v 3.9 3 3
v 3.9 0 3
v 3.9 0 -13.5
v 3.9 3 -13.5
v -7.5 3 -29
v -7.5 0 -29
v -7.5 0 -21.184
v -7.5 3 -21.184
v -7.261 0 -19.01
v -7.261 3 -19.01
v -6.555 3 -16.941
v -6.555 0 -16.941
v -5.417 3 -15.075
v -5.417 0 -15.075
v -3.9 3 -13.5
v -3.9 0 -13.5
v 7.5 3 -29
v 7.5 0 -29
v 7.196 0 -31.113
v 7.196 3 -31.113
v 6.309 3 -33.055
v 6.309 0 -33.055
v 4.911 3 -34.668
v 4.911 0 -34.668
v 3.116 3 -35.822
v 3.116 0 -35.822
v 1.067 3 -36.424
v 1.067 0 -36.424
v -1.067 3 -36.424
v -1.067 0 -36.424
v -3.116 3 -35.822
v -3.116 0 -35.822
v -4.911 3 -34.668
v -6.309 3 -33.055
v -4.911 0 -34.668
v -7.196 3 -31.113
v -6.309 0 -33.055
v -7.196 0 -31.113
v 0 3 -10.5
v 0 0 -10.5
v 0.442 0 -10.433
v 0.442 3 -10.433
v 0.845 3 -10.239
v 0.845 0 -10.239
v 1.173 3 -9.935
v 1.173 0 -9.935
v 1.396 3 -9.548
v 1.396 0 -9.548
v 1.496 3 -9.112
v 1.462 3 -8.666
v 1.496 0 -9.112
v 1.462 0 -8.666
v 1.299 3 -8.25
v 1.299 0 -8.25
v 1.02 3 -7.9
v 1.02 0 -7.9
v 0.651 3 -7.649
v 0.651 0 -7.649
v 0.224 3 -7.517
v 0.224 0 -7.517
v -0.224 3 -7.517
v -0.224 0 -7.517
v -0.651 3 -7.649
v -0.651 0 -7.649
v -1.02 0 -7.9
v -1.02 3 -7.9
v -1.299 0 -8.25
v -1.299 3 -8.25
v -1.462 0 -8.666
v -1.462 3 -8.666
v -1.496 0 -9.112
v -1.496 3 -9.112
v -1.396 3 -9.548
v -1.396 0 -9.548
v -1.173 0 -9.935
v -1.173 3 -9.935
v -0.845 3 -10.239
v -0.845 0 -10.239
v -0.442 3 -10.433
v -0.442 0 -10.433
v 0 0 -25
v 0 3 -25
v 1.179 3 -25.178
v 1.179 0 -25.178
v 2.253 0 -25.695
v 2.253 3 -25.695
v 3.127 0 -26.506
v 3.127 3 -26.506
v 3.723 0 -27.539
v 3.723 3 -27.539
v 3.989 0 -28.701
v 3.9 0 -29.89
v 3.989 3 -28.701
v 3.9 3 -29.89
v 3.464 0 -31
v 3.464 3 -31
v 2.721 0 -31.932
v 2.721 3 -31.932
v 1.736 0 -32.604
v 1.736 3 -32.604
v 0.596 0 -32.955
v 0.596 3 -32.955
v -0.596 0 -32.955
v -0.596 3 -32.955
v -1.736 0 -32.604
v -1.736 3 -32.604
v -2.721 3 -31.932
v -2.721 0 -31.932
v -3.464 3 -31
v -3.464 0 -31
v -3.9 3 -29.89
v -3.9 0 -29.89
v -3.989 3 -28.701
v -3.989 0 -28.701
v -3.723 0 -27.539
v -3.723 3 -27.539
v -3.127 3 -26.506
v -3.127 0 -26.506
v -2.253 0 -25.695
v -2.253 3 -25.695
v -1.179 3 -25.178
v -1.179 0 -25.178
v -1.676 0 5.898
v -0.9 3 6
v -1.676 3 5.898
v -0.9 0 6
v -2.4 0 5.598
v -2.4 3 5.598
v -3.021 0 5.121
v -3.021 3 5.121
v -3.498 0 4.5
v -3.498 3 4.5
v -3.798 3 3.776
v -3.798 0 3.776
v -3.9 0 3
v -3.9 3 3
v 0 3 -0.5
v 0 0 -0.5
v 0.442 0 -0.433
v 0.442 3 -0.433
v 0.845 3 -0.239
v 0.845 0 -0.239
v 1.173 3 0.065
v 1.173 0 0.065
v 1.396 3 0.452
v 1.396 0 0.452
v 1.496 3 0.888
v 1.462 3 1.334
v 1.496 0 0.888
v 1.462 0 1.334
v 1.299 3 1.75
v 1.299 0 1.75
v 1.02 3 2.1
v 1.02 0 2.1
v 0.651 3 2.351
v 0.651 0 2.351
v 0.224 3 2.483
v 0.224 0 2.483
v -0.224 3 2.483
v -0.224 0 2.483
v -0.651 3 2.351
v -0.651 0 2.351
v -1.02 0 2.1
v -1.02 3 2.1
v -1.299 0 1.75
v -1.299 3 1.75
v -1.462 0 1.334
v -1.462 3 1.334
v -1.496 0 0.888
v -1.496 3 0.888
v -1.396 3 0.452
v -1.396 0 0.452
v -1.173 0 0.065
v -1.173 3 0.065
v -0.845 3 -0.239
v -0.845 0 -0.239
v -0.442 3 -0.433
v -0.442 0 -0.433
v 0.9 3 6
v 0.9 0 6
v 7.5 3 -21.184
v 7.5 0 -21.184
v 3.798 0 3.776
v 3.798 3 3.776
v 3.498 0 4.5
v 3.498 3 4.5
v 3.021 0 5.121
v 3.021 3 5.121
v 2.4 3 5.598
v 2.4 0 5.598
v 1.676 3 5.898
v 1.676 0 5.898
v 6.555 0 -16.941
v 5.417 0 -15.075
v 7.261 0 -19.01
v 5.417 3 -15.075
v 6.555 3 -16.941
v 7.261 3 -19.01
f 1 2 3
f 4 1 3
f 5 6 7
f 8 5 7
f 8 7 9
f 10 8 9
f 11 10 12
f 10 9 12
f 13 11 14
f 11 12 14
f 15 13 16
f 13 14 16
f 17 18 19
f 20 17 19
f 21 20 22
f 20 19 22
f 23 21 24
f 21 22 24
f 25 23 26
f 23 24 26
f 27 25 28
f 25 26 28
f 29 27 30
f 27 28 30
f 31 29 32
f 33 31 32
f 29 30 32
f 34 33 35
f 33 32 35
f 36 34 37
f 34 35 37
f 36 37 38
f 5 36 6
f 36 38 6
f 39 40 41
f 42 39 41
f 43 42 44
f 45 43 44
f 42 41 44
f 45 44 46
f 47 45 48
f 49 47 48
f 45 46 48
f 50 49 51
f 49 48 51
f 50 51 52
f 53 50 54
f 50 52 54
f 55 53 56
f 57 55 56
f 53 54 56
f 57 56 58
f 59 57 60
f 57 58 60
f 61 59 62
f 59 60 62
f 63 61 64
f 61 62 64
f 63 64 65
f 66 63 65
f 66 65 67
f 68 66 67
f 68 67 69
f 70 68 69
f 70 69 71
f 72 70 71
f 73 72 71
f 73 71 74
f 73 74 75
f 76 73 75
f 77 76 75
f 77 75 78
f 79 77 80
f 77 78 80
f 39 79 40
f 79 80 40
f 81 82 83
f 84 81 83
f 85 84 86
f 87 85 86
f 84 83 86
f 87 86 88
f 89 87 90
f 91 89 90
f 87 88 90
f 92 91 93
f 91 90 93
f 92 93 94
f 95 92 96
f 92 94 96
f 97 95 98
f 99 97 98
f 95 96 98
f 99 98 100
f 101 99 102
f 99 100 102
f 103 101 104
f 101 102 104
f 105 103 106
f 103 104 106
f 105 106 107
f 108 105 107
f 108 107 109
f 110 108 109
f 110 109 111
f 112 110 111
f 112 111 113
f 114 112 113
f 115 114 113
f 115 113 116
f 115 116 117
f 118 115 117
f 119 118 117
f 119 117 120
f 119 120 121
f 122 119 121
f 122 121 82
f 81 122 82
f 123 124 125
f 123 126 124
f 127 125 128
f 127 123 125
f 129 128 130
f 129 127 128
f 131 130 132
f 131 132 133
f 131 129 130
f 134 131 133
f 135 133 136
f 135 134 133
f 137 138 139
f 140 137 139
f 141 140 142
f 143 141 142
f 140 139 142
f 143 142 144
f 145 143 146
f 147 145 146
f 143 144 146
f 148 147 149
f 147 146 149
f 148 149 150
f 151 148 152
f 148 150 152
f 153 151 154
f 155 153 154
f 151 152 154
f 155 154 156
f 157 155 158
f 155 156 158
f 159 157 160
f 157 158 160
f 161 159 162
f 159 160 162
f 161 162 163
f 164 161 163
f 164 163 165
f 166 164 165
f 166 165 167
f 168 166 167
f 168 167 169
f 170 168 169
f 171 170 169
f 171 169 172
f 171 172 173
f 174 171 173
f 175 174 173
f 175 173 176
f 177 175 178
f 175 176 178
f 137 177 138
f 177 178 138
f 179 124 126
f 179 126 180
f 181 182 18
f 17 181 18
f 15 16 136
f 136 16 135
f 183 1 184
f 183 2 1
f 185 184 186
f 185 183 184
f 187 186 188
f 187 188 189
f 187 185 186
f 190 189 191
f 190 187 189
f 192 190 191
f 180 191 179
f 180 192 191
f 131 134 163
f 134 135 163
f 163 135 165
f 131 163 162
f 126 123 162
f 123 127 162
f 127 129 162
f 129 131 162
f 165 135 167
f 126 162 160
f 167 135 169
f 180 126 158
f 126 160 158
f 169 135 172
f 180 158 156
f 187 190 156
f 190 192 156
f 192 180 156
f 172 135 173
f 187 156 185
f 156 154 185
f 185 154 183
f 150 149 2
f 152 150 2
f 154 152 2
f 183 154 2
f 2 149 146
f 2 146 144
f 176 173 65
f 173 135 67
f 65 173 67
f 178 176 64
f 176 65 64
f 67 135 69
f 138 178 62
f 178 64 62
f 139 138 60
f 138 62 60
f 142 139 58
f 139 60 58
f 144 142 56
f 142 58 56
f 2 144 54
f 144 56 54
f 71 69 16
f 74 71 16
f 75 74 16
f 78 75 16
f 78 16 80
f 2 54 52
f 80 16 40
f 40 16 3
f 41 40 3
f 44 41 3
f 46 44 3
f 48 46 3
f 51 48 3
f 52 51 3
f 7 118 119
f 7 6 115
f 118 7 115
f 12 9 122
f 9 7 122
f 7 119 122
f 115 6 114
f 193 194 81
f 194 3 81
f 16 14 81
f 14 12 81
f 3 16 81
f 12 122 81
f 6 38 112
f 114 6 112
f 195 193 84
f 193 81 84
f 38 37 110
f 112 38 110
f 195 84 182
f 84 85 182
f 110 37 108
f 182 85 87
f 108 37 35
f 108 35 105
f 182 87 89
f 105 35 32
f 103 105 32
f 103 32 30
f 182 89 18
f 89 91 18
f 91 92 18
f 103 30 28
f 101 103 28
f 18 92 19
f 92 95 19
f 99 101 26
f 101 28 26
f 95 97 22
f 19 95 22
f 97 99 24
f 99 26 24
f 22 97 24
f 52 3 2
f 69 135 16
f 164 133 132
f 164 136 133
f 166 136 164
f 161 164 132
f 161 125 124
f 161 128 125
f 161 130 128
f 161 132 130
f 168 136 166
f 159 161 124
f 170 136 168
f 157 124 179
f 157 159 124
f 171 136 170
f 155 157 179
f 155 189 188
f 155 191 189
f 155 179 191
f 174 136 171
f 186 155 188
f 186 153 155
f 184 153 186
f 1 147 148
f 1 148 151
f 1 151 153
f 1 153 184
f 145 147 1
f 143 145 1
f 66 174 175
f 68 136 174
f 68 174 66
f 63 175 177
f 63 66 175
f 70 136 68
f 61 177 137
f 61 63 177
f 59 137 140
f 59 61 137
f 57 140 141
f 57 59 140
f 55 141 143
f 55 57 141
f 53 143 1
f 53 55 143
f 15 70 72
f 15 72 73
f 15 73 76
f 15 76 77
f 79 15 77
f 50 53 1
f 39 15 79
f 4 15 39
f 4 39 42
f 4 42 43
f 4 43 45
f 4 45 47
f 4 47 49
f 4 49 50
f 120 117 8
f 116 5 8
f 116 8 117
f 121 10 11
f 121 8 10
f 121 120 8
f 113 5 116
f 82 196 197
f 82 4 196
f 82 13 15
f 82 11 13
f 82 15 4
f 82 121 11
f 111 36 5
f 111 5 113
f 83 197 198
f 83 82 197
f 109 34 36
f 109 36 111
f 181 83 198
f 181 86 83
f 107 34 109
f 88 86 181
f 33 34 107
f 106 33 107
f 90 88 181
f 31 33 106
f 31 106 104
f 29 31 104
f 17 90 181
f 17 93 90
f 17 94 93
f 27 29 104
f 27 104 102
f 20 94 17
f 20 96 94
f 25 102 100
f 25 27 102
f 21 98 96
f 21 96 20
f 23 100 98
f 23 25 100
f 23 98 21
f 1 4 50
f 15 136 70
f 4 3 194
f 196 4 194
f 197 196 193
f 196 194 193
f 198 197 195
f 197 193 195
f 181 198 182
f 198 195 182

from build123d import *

# Parameters (mm, degrees)
EXTRUDE_1_DEPTH     = 3
SKETCH_2_R          = 4
CUT_EXTRUDE_1_DEPTH = 8
SKETCH_3_R          = 1.5
CUT_EXTRUDE_2_DEPTH = 3
CUT_EXTRUDE_3_DEPTH = 10
FILLET_1_R          = 10
SKETCH_5_W          = 7.8
SKETCH_5_H          = 20.5
CUT_EXTRUDE_4_DEPTH = 10
FILLET_3_R          = 3


with BuildPart() as part:
    # 草图1 → 凸台-拉伸1 (new body)
    with BuildSketch(Plane(origin=(0, 0, 0), x_dir=(1, 0, 0), z_dir=(0, 1, 0))):
        with BuildLine():
            Line((-7.5, -29), (7.5, -29))
            Line((7.5, -29), (7.5, 29))
            ThreePointArc((7.5, 29), (0, 36.5), (-7.5, 29))
            Line((-7.5, 29), (-7.5, -29))
        make_face()
    extrude(amount=EXTRUDE_1_DEPTH)

    # 草图2 → 切除-拉伸1 (cut)
    with BuildSketch(Plane(origin=(0, 3, 0), x_dir=(1, 0, 0), z_dir=(0, 1, 0))):
        with Locations(Location((0, 29, 0), (0, 0, 270))):
            Circle(SKETCH_2_R)
    extrude(amount=-CUT_EXTRUDE_1_DEPTH, mode=Mode.SUBTRACT)

    # 草图3 → 切除-拉伸2 (cut)
    with BuildSketch(Plane.XZ):
        with Locations(Location((0, 1, 0), (0, 0, 270))):
            Circle(SKETCH_3_R)
        with Locations(Location((0, -9, 0), (0, 0, 270))):
            Circle(SKETCH_3_R)
    extrude(amount=-CUT_EXTRUDE_2_DEPTH, mode=Mode.SUBTRACT)

    # 草图4 → 切除-拉伸3 (cut)
    with BuildSketch(Plane.XZ):
        Polygon((-7.5, -13.5), (-3.9, -13.5), (-3.9, 26.5), (3.9, 26.5), (3.9, -13.5), (7.5, -13.5), (7.5, 29), (-7.5, 29), align=None)
    extrude(amount=-CUT_EXTRUDE_3_DEPTH, mode=Mode.SUBTRACT)

    # 圆角1
    # the kernel refuses this fillet: 10 mm, written as the material it takes off along each edge
    with BuildSketch(Plane(origin=(7.5, -19.209372712, -13.5), x_dir=(0, 0, -1), z_dir=(0, 1, 0))) as fillet_1_piece_1:
        with BuildLine():
            CenterArc((7.683749085, 10), FILLET_1_R, 219.7918195, 50.2081805)
            Line((0, 3.6), (-0.153674982, 3.472))
            ThreePointArc((-0.153674982, 3.472), (-0.2, 1.8), (-0.2, 0))
            Line((-0.2, 0), (0, -0.2))
            Line((0, -0.2), (7.683749085, -0.2))
            Line((7.683749085, -0.2), (7.683749085, 0))
        make_face()
    extrude(amount=41.418745425, mode=Mode.SUBTRACT)
    with BuildSketch(Plane(origin=(-7.5, -19.209372712, -13.5), x_dir=(0, 0, -1), z_dir=(0, 1, 0))) as fillet_1_piece_2:
        with BuildLine():
            CenterArc((7.683749085, -10), FILLET_1_R, 90, 50.2081805)
            Line((0, -3.6), (-0.153674982, -3.472))
            ThreePointArc((-0.153674982, -3.472), (-0.2, -1.8), (-0.2, 0))
            Line((-0.2, 0), (0, 0.2))
            Line((0, 0.2), (7.683749085, 0.2))
            Line((7.683749085, 0.2), (7.683749085, 0))
        make_face()
    extrude(amount=41.418745425, mode=Mode.SUBTRACT)

    # 草图5 → 切除-拉伸4 (cut)
    with BuildSketch(Plane(origin=(0, 3, 0), x_dir=(1, 0, 0), z_dir=(0, 1, 0))):
        with Locations((0, -16.25)):
            Rectangle(SKETCH_5_W, SKETCH_5_H)
    extrude(amount=-CUT_EXTRUDE_4_DEPTH, mode=Mode.SUBTRACT)

    # 圆角3
    fillet_3_edges = [part.edges().sort_by_distance(p)[0] for p in [
        (-3.9, 1.5, 6),
        (3.9, 1.5, 6),
    ]]
    fillet(fillet_3_edges, radius=FILLET_3_R)


solid = part.part
